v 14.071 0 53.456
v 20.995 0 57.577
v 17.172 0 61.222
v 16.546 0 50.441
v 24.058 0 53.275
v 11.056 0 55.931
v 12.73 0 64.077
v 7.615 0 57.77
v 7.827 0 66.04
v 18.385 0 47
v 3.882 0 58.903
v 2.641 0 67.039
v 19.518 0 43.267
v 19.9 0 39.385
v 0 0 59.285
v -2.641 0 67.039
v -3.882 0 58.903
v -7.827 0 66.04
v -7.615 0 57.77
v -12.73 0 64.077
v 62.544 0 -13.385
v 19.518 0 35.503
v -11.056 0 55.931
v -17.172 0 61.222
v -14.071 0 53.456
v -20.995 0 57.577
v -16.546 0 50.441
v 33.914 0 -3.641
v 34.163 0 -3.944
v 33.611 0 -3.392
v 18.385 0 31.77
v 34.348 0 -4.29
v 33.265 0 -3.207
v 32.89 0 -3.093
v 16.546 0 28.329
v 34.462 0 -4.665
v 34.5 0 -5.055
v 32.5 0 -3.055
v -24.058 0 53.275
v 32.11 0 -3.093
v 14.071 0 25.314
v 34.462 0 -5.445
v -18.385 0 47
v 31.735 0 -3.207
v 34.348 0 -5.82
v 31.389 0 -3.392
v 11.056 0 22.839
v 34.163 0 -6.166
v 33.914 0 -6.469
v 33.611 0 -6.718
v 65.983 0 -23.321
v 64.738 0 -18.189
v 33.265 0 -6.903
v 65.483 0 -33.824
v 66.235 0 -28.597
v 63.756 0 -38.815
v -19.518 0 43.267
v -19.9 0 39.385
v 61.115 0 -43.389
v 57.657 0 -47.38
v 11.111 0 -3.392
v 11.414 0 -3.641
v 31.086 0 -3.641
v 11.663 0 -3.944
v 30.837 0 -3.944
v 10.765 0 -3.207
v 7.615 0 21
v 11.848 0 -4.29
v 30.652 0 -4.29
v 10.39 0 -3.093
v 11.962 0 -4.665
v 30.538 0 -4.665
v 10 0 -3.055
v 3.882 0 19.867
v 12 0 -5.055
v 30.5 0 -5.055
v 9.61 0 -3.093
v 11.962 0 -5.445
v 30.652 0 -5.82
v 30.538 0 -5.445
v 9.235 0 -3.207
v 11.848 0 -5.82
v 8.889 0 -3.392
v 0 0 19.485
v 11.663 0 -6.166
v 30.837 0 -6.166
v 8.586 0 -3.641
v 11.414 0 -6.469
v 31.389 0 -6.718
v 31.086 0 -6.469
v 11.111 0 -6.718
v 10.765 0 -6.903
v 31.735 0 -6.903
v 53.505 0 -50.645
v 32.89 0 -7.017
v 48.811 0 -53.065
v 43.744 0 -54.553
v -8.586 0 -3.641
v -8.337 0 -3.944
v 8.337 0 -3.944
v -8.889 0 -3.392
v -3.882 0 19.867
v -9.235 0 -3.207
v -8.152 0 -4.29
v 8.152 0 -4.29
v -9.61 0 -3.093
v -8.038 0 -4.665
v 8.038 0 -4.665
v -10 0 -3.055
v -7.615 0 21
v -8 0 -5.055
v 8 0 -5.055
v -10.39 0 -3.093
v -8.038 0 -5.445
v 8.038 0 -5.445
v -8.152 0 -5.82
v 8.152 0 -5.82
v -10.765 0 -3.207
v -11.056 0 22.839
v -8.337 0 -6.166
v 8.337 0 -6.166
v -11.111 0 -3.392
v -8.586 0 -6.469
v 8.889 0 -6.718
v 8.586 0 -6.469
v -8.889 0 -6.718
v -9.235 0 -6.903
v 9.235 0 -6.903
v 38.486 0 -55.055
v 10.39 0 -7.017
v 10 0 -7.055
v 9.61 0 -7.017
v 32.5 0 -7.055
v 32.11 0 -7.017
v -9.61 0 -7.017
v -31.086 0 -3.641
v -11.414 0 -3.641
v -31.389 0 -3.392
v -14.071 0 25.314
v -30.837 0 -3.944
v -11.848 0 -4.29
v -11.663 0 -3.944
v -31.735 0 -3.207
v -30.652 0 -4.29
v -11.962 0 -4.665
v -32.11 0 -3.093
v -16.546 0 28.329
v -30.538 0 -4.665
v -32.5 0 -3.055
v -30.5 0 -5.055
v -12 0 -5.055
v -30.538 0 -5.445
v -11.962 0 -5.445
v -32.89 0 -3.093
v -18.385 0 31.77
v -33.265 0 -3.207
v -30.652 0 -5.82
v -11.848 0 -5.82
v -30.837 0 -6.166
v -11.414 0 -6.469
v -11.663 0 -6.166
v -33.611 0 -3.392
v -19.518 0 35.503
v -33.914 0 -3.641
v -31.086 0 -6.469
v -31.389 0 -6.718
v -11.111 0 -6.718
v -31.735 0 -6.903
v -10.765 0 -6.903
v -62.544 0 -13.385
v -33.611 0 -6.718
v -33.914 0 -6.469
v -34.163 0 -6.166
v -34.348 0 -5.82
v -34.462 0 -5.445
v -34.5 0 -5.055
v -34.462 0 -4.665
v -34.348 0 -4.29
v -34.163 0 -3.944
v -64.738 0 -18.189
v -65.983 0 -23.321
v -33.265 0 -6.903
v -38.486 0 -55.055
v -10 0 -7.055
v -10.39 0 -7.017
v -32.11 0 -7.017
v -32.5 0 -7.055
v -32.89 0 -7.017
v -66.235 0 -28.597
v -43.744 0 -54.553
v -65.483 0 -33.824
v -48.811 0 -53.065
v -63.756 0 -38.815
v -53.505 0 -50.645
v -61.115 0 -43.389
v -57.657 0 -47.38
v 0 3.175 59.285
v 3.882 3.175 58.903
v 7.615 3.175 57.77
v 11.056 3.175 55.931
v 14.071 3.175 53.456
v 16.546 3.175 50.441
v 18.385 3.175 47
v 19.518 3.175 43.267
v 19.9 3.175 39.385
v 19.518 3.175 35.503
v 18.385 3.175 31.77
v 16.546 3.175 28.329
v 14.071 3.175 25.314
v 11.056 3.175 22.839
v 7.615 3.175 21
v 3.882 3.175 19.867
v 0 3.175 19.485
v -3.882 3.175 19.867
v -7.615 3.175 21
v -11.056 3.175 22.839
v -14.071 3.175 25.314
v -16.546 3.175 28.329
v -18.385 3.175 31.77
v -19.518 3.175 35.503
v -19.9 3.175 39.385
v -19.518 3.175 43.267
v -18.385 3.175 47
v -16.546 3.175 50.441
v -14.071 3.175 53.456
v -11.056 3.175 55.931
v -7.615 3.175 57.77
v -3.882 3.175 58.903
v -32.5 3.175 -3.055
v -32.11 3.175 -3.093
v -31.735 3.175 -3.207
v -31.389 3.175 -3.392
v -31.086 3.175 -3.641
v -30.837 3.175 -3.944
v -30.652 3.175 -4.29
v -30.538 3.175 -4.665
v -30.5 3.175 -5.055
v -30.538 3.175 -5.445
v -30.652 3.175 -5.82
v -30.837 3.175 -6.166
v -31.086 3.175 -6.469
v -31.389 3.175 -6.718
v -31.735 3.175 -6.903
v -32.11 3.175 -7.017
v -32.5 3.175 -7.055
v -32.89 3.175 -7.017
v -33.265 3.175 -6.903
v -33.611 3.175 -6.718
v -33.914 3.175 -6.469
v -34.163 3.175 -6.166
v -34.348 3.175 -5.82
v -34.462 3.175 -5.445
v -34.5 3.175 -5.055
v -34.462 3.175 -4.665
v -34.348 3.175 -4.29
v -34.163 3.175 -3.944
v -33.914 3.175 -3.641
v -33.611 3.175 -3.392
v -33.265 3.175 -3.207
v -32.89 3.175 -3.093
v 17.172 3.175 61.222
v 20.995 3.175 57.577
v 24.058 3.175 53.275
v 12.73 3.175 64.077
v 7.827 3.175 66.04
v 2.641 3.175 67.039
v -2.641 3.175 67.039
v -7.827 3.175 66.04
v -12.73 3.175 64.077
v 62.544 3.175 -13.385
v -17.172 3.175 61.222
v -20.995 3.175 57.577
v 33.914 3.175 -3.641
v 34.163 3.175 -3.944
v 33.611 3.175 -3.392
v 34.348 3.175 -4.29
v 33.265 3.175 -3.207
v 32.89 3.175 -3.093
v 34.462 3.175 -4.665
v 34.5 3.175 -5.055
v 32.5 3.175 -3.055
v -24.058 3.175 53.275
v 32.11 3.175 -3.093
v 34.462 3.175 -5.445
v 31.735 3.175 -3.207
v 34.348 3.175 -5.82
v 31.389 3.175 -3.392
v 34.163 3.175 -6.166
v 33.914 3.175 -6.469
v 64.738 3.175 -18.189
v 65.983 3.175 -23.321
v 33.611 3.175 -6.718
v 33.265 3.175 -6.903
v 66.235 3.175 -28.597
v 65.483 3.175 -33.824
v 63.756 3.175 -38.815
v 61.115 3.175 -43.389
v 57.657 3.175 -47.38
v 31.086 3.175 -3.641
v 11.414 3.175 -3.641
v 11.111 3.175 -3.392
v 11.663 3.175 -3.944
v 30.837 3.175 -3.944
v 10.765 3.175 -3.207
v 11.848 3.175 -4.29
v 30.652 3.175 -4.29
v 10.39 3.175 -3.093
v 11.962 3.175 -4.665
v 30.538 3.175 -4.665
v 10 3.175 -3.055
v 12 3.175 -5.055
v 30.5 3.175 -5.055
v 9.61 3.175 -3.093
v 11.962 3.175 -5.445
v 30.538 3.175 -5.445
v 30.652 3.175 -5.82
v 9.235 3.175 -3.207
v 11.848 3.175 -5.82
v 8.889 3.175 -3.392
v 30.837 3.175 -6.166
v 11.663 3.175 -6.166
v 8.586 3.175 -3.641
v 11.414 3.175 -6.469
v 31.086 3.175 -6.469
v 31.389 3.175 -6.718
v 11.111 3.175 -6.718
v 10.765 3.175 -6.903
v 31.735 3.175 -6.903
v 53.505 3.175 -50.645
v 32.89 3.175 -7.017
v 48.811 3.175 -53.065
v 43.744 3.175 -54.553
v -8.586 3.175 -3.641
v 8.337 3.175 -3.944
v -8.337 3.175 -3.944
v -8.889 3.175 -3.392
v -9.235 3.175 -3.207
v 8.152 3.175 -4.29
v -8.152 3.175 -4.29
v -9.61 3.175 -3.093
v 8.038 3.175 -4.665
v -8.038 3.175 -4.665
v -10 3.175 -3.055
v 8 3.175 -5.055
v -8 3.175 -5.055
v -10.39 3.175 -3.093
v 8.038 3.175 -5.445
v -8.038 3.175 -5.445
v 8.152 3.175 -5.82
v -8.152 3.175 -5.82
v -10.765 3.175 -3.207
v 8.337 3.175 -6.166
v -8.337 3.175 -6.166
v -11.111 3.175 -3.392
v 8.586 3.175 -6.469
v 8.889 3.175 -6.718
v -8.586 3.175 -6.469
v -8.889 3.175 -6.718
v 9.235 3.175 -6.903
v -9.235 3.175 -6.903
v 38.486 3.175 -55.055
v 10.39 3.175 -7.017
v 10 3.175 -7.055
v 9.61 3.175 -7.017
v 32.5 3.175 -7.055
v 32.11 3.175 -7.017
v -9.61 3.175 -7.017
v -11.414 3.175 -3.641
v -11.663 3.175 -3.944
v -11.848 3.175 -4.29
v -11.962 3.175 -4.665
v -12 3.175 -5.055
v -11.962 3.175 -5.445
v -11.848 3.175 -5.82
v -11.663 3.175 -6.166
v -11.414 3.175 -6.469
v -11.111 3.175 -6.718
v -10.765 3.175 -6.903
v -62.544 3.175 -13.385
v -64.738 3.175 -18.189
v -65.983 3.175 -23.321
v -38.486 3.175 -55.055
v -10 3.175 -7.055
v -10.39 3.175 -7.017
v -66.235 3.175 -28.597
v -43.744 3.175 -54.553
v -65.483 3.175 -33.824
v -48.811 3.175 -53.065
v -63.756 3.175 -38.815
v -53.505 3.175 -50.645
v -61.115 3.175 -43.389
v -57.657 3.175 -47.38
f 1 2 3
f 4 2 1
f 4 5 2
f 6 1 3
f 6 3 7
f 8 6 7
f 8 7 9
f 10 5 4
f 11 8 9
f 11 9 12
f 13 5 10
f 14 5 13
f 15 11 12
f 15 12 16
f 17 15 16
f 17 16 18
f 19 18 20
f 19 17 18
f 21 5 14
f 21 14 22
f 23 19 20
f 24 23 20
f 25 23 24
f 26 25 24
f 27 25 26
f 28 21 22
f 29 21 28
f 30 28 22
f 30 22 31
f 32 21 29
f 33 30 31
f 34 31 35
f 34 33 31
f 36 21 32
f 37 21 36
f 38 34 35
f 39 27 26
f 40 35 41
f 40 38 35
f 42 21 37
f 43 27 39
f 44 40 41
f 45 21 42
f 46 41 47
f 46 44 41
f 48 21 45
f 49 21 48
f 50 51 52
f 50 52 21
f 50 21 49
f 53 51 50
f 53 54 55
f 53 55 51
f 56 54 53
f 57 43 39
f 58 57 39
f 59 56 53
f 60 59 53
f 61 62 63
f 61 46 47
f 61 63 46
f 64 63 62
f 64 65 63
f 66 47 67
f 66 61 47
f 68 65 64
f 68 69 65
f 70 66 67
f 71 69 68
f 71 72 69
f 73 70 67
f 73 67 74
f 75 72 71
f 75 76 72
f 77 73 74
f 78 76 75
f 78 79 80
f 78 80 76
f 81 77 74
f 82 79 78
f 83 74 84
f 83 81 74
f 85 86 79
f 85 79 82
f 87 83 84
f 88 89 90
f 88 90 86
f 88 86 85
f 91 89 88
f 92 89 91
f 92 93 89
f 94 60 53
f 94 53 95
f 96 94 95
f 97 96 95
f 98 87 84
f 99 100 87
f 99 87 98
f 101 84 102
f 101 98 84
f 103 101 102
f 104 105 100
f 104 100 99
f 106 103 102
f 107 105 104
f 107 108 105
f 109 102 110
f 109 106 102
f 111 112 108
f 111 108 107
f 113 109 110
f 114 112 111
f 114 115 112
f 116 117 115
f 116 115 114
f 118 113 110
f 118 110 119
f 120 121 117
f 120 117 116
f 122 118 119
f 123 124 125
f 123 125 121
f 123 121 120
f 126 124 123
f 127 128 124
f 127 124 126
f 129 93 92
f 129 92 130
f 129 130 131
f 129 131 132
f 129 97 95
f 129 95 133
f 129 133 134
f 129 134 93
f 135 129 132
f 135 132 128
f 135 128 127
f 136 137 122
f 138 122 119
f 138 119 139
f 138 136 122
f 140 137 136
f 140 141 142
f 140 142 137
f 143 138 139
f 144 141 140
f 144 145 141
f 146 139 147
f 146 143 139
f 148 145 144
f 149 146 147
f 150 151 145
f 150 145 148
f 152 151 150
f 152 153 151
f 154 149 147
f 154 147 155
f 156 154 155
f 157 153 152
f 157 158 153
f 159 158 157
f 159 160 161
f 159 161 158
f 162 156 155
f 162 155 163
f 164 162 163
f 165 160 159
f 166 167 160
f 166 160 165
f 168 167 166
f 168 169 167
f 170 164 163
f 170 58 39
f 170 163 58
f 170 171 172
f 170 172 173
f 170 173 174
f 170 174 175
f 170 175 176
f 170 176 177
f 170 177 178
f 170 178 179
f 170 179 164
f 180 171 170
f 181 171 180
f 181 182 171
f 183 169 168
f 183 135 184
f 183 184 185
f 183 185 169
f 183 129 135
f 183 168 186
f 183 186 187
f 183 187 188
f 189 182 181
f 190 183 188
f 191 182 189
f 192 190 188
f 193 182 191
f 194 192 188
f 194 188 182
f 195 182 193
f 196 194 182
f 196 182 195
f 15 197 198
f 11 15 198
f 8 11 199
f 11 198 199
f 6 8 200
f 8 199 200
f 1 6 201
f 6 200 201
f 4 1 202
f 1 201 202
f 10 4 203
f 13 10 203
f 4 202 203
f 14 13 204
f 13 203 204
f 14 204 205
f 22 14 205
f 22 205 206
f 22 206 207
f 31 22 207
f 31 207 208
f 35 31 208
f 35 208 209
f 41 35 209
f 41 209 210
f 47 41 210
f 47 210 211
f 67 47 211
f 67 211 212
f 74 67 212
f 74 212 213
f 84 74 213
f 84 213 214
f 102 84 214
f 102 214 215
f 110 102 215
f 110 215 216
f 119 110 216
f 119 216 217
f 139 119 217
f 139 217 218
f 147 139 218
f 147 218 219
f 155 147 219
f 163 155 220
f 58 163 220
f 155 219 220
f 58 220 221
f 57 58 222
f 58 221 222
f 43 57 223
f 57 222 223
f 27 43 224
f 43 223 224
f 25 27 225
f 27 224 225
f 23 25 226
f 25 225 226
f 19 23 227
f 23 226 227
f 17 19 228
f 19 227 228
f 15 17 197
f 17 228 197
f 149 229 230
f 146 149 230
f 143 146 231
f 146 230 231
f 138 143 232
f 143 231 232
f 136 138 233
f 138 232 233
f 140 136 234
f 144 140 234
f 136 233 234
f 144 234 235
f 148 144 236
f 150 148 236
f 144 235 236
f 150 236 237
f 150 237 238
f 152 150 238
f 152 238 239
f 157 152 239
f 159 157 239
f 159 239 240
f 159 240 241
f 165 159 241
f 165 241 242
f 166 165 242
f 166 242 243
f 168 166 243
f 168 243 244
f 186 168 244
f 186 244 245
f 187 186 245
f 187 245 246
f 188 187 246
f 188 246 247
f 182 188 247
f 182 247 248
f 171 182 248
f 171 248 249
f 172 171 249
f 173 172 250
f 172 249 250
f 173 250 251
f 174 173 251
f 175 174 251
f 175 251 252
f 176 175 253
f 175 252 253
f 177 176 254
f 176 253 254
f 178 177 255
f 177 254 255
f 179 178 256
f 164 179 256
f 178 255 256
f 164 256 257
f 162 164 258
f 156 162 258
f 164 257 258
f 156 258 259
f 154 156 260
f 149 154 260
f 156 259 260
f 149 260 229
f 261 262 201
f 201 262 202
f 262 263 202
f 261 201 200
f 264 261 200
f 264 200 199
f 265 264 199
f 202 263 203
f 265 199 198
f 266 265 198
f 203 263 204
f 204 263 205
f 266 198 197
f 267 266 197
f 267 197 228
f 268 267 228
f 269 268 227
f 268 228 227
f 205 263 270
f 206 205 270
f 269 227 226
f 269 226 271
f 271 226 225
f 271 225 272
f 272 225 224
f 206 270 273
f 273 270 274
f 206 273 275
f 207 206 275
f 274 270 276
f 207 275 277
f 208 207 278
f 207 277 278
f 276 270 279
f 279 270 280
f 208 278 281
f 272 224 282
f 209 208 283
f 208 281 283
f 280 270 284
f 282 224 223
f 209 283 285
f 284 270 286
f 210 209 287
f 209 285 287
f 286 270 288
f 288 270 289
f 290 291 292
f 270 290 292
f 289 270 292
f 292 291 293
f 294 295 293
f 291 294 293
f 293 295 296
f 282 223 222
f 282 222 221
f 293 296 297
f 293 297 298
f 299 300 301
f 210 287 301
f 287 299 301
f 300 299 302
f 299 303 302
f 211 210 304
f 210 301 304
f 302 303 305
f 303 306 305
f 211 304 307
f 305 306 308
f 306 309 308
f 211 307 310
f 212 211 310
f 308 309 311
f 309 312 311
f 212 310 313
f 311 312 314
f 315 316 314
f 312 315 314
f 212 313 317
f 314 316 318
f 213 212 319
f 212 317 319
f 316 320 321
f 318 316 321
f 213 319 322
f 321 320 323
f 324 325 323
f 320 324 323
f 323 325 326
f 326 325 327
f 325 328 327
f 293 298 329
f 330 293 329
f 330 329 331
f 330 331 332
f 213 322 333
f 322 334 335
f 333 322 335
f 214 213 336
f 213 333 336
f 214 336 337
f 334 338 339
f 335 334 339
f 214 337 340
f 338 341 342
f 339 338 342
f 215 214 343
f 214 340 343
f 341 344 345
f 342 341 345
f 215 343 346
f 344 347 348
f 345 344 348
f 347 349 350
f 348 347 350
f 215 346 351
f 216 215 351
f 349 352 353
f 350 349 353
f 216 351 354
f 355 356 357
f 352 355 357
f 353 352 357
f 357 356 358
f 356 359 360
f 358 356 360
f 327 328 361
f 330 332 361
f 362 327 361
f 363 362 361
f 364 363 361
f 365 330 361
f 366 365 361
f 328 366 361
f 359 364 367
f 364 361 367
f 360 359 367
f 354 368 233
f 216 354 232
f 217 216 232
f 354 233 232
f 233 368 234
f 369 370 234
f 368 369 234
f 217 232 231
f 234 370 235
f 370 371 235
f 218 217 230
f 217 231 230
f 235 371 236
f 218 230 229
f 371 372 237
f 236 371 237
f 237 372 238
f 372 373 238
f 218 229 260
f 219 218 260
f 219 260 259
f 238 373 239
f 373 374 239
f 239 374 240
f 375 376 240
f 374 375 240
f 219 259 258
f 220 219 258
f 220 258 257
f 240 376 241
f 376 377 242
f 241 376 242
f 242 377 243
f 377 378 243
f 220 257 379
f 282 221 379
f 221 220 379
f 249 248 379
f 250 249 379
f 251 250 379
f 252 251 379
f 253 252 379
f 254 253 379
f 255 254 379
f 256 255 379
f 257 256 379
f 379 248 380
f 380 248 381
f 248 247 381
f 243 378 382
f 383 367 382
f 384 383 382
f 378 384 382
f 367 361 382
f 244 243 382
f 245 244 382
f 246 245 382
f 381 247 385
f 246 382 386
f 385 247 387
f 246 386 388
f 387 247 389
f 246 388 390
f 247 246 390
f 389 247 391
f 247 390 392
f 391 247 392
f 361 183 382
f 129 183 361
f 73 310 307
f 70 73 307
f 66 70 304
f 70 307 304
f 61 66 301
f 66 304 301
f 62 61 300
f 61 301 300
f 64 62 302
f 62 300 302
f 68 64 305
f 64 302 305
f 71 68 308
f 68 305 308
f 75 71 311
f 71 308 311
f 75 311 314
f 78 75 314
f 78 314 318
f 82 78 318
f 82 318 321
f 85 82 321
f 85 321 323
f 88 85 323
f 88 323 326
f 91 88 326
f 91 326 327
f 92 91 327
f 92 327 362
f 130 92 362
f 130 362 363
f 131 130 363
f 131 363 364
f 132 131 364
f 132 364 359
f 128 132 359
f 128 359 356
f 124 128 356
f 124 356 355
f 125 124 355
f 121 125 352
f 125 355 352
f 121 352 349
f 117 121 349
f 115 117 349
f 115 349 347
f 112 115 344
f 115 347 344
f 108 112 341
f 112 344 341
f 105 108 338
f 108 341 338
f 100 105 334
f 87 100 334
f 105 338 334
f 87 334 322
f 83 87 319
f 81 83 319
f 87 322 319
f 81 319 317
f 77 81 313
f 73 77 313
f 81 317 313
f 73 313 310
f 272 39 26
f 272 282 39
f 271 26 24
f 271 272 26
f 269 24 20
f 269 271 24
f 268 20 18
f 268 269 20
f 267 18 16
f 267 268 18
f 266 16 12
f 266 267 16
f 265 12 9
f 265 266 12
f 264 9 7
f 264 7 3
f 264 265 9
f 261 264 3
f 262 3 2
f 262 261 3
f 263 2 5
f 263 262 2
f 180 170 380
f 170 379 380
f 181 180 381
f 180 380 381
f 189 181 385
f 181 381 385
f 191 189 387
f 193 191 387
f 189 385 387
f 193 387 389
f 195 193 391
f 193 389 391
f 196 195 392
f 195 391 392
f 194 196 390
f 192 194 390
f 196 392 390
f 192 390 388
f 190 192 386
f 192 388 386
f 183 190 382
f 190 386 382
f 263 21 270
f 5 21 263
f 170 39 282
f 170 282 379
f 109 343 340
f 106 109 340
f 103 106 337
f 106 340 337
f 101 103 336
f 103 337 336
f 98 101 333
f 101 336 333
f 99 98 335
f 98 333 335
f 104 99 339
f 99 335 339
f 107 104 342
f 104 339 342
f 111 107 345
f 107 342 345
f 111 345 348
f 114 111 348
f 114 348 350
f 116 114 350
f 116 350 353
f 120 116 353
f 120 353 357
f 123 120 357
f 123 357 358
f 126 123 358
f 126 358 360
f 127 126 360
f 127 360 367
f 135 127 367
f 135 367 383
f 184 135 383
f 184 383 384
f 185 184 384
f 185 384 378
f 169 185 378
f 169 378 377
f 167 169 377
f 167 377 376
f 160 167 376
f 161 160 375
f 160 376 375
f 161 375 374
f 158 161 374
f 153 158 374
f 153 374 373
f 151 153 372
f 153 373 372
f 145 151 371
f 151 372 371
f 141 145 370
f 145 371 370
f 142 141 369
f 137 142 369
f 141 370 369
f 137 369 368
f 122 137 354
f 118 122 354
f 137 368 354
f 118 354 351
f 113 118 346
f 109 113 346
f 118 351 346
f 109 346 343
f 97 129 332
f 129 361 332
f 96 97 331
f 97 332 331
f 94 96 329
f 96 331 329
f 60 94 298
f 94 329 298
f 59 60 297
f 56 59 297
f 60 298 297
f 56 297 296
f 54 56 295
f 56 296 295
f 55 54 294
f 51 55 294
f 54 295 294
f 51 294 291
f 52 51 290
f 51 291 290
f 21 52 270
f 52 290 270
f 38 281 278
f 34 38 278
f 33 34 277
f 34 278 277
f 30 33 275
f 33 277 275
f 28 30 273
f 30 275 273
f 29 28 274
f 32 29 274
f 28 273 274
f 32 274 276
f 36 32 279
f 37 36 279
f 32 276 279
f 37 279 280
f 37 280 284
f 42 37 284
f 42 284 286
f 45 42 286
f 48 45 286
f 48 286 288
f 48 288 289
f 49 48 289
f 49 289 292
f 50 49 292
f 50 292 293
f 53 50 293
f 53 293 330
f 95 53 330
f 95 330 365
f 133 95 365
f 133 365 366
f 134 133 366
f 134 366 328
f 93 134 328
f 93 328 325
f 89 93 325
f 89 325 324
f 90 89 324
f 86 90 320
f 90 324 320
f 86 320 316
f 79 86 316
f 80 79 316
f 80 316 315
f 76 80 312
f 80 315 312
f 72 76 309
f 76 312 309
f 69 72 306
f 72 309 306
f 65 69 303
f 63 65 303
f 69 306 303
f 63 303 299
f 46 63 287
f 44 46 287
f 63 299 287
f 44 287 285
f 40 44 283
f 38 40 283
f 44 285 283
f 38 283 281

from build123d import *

# Parameters (mm, degrees)
BOSS_EXTRUDE1_DEPTH = 3.175
FILLET1_R           = 27.78
SKETCH5_R           = 2
CUT_EXTRUDE2_DEPTH  = 95.405671522
SKETCH7_R           = 1.5
SKETCH7_R_2         = 3.925
CUT_EXTRUDE3_DEPTH  = 10
SKETCH2_R           = 19.9
CUT_EXTRUDE4_DEPTH  = 95.405671522


with BuildPart() as part:
    # Sketch1 → Boss-Extrude1 (new body)
    with BuildSketch(Plane(origin=(0, 0, 0), x_dir=(1, 0, 0), z_dir=(0, 1, 0))):
        Polygon((0, -94.945058207), (-86.602540378, 55.054941793), (86.602540378, 55.054941793), align=None)
    extrude(amount=BOSS_EXTRUDE1_DEPTH)

    # Fillet1
    fillet1_edges = [part.edges().sort_by_distance(p)[0] for p in [
        (0, 1.5875, 94.945058207),
        (-86.602540378, 1.5875, -55.054941793),
        (86.602540378, 1.5875, -55.054941793),
    ]]
    fillet(fillet1_edges, radius=FILLET1_R)

    # Sketch5 → Cut-Extrude2 (cut, through all)
    with BuildSketch(Plane(origin=(0, 3.175, 0), x_dir=(1, 0, 0), z_dir=(0, 1, 0))):
        with Locations(Location((32.5, 5.054941793, 0), (0, 0, 270))):
            Circle(SKETCH5_R)
        with Locations(Location((-32.5, 5.054941793, 0), (0, 0, 270))):
            Circle(SKETCH5_R)
        with Locations(Location((-10, 5.054941793, 0), (0, 0, 270))):
            Circle(SKETCH5_R)
        with Locations(Location((10, 5.054941793, 0), (0, 0, 270))):
            Circle(SKETCH5_R)
    extrude(amount=-CUT_EXTRUDE2_DEPTH, mode=Mode.SUBTRACT)

    # Sketch7 → Cut-Extrude3 (cut)
    with BuildSketch(Plane(origin=(0, 3.175, 0), x_dir=(1, 0, 0), z_dir=(0, 1, 0))):
        with Locations(Location((0, -30.885058207, 0), (0, 0, 270))):
            Circle(SKETCH7_R)
        with Locations(Location((-7.361215932, -43.635058207, 0), (0, 0, 270))):
            Circle(SKETCH7_R)
        with Locations(Location((0, -39.385058207, 0), (0, 0, 270))):
            Circle(SKETCH7_R_2)
        with Locations(Location((7.361215932, -43.635058207, 0), (0, 0, 270))):
            Circle(SKETCH7_R)
    extrude(amount=-CUT_EXTRUDE3_DEPTH, mode=Mode.SUBTRACT)

    # Sketch2 → Cut-Extrude4 (cut, through all)
    with BuildSketch(Plane(origin=(0, 3.175, 0), x_dir=(1, 0, 0), z_dir=(0, 1, 0))):
        with Locations(Location((0, -39.385058207, 0), (0, 0, 270))):
            Circle(SKETCH2_R)
    extrude(amount=-CUT_EXTRUDE4_DEPTH, mode=Mode.SUBTRACT)


solid = part.part
